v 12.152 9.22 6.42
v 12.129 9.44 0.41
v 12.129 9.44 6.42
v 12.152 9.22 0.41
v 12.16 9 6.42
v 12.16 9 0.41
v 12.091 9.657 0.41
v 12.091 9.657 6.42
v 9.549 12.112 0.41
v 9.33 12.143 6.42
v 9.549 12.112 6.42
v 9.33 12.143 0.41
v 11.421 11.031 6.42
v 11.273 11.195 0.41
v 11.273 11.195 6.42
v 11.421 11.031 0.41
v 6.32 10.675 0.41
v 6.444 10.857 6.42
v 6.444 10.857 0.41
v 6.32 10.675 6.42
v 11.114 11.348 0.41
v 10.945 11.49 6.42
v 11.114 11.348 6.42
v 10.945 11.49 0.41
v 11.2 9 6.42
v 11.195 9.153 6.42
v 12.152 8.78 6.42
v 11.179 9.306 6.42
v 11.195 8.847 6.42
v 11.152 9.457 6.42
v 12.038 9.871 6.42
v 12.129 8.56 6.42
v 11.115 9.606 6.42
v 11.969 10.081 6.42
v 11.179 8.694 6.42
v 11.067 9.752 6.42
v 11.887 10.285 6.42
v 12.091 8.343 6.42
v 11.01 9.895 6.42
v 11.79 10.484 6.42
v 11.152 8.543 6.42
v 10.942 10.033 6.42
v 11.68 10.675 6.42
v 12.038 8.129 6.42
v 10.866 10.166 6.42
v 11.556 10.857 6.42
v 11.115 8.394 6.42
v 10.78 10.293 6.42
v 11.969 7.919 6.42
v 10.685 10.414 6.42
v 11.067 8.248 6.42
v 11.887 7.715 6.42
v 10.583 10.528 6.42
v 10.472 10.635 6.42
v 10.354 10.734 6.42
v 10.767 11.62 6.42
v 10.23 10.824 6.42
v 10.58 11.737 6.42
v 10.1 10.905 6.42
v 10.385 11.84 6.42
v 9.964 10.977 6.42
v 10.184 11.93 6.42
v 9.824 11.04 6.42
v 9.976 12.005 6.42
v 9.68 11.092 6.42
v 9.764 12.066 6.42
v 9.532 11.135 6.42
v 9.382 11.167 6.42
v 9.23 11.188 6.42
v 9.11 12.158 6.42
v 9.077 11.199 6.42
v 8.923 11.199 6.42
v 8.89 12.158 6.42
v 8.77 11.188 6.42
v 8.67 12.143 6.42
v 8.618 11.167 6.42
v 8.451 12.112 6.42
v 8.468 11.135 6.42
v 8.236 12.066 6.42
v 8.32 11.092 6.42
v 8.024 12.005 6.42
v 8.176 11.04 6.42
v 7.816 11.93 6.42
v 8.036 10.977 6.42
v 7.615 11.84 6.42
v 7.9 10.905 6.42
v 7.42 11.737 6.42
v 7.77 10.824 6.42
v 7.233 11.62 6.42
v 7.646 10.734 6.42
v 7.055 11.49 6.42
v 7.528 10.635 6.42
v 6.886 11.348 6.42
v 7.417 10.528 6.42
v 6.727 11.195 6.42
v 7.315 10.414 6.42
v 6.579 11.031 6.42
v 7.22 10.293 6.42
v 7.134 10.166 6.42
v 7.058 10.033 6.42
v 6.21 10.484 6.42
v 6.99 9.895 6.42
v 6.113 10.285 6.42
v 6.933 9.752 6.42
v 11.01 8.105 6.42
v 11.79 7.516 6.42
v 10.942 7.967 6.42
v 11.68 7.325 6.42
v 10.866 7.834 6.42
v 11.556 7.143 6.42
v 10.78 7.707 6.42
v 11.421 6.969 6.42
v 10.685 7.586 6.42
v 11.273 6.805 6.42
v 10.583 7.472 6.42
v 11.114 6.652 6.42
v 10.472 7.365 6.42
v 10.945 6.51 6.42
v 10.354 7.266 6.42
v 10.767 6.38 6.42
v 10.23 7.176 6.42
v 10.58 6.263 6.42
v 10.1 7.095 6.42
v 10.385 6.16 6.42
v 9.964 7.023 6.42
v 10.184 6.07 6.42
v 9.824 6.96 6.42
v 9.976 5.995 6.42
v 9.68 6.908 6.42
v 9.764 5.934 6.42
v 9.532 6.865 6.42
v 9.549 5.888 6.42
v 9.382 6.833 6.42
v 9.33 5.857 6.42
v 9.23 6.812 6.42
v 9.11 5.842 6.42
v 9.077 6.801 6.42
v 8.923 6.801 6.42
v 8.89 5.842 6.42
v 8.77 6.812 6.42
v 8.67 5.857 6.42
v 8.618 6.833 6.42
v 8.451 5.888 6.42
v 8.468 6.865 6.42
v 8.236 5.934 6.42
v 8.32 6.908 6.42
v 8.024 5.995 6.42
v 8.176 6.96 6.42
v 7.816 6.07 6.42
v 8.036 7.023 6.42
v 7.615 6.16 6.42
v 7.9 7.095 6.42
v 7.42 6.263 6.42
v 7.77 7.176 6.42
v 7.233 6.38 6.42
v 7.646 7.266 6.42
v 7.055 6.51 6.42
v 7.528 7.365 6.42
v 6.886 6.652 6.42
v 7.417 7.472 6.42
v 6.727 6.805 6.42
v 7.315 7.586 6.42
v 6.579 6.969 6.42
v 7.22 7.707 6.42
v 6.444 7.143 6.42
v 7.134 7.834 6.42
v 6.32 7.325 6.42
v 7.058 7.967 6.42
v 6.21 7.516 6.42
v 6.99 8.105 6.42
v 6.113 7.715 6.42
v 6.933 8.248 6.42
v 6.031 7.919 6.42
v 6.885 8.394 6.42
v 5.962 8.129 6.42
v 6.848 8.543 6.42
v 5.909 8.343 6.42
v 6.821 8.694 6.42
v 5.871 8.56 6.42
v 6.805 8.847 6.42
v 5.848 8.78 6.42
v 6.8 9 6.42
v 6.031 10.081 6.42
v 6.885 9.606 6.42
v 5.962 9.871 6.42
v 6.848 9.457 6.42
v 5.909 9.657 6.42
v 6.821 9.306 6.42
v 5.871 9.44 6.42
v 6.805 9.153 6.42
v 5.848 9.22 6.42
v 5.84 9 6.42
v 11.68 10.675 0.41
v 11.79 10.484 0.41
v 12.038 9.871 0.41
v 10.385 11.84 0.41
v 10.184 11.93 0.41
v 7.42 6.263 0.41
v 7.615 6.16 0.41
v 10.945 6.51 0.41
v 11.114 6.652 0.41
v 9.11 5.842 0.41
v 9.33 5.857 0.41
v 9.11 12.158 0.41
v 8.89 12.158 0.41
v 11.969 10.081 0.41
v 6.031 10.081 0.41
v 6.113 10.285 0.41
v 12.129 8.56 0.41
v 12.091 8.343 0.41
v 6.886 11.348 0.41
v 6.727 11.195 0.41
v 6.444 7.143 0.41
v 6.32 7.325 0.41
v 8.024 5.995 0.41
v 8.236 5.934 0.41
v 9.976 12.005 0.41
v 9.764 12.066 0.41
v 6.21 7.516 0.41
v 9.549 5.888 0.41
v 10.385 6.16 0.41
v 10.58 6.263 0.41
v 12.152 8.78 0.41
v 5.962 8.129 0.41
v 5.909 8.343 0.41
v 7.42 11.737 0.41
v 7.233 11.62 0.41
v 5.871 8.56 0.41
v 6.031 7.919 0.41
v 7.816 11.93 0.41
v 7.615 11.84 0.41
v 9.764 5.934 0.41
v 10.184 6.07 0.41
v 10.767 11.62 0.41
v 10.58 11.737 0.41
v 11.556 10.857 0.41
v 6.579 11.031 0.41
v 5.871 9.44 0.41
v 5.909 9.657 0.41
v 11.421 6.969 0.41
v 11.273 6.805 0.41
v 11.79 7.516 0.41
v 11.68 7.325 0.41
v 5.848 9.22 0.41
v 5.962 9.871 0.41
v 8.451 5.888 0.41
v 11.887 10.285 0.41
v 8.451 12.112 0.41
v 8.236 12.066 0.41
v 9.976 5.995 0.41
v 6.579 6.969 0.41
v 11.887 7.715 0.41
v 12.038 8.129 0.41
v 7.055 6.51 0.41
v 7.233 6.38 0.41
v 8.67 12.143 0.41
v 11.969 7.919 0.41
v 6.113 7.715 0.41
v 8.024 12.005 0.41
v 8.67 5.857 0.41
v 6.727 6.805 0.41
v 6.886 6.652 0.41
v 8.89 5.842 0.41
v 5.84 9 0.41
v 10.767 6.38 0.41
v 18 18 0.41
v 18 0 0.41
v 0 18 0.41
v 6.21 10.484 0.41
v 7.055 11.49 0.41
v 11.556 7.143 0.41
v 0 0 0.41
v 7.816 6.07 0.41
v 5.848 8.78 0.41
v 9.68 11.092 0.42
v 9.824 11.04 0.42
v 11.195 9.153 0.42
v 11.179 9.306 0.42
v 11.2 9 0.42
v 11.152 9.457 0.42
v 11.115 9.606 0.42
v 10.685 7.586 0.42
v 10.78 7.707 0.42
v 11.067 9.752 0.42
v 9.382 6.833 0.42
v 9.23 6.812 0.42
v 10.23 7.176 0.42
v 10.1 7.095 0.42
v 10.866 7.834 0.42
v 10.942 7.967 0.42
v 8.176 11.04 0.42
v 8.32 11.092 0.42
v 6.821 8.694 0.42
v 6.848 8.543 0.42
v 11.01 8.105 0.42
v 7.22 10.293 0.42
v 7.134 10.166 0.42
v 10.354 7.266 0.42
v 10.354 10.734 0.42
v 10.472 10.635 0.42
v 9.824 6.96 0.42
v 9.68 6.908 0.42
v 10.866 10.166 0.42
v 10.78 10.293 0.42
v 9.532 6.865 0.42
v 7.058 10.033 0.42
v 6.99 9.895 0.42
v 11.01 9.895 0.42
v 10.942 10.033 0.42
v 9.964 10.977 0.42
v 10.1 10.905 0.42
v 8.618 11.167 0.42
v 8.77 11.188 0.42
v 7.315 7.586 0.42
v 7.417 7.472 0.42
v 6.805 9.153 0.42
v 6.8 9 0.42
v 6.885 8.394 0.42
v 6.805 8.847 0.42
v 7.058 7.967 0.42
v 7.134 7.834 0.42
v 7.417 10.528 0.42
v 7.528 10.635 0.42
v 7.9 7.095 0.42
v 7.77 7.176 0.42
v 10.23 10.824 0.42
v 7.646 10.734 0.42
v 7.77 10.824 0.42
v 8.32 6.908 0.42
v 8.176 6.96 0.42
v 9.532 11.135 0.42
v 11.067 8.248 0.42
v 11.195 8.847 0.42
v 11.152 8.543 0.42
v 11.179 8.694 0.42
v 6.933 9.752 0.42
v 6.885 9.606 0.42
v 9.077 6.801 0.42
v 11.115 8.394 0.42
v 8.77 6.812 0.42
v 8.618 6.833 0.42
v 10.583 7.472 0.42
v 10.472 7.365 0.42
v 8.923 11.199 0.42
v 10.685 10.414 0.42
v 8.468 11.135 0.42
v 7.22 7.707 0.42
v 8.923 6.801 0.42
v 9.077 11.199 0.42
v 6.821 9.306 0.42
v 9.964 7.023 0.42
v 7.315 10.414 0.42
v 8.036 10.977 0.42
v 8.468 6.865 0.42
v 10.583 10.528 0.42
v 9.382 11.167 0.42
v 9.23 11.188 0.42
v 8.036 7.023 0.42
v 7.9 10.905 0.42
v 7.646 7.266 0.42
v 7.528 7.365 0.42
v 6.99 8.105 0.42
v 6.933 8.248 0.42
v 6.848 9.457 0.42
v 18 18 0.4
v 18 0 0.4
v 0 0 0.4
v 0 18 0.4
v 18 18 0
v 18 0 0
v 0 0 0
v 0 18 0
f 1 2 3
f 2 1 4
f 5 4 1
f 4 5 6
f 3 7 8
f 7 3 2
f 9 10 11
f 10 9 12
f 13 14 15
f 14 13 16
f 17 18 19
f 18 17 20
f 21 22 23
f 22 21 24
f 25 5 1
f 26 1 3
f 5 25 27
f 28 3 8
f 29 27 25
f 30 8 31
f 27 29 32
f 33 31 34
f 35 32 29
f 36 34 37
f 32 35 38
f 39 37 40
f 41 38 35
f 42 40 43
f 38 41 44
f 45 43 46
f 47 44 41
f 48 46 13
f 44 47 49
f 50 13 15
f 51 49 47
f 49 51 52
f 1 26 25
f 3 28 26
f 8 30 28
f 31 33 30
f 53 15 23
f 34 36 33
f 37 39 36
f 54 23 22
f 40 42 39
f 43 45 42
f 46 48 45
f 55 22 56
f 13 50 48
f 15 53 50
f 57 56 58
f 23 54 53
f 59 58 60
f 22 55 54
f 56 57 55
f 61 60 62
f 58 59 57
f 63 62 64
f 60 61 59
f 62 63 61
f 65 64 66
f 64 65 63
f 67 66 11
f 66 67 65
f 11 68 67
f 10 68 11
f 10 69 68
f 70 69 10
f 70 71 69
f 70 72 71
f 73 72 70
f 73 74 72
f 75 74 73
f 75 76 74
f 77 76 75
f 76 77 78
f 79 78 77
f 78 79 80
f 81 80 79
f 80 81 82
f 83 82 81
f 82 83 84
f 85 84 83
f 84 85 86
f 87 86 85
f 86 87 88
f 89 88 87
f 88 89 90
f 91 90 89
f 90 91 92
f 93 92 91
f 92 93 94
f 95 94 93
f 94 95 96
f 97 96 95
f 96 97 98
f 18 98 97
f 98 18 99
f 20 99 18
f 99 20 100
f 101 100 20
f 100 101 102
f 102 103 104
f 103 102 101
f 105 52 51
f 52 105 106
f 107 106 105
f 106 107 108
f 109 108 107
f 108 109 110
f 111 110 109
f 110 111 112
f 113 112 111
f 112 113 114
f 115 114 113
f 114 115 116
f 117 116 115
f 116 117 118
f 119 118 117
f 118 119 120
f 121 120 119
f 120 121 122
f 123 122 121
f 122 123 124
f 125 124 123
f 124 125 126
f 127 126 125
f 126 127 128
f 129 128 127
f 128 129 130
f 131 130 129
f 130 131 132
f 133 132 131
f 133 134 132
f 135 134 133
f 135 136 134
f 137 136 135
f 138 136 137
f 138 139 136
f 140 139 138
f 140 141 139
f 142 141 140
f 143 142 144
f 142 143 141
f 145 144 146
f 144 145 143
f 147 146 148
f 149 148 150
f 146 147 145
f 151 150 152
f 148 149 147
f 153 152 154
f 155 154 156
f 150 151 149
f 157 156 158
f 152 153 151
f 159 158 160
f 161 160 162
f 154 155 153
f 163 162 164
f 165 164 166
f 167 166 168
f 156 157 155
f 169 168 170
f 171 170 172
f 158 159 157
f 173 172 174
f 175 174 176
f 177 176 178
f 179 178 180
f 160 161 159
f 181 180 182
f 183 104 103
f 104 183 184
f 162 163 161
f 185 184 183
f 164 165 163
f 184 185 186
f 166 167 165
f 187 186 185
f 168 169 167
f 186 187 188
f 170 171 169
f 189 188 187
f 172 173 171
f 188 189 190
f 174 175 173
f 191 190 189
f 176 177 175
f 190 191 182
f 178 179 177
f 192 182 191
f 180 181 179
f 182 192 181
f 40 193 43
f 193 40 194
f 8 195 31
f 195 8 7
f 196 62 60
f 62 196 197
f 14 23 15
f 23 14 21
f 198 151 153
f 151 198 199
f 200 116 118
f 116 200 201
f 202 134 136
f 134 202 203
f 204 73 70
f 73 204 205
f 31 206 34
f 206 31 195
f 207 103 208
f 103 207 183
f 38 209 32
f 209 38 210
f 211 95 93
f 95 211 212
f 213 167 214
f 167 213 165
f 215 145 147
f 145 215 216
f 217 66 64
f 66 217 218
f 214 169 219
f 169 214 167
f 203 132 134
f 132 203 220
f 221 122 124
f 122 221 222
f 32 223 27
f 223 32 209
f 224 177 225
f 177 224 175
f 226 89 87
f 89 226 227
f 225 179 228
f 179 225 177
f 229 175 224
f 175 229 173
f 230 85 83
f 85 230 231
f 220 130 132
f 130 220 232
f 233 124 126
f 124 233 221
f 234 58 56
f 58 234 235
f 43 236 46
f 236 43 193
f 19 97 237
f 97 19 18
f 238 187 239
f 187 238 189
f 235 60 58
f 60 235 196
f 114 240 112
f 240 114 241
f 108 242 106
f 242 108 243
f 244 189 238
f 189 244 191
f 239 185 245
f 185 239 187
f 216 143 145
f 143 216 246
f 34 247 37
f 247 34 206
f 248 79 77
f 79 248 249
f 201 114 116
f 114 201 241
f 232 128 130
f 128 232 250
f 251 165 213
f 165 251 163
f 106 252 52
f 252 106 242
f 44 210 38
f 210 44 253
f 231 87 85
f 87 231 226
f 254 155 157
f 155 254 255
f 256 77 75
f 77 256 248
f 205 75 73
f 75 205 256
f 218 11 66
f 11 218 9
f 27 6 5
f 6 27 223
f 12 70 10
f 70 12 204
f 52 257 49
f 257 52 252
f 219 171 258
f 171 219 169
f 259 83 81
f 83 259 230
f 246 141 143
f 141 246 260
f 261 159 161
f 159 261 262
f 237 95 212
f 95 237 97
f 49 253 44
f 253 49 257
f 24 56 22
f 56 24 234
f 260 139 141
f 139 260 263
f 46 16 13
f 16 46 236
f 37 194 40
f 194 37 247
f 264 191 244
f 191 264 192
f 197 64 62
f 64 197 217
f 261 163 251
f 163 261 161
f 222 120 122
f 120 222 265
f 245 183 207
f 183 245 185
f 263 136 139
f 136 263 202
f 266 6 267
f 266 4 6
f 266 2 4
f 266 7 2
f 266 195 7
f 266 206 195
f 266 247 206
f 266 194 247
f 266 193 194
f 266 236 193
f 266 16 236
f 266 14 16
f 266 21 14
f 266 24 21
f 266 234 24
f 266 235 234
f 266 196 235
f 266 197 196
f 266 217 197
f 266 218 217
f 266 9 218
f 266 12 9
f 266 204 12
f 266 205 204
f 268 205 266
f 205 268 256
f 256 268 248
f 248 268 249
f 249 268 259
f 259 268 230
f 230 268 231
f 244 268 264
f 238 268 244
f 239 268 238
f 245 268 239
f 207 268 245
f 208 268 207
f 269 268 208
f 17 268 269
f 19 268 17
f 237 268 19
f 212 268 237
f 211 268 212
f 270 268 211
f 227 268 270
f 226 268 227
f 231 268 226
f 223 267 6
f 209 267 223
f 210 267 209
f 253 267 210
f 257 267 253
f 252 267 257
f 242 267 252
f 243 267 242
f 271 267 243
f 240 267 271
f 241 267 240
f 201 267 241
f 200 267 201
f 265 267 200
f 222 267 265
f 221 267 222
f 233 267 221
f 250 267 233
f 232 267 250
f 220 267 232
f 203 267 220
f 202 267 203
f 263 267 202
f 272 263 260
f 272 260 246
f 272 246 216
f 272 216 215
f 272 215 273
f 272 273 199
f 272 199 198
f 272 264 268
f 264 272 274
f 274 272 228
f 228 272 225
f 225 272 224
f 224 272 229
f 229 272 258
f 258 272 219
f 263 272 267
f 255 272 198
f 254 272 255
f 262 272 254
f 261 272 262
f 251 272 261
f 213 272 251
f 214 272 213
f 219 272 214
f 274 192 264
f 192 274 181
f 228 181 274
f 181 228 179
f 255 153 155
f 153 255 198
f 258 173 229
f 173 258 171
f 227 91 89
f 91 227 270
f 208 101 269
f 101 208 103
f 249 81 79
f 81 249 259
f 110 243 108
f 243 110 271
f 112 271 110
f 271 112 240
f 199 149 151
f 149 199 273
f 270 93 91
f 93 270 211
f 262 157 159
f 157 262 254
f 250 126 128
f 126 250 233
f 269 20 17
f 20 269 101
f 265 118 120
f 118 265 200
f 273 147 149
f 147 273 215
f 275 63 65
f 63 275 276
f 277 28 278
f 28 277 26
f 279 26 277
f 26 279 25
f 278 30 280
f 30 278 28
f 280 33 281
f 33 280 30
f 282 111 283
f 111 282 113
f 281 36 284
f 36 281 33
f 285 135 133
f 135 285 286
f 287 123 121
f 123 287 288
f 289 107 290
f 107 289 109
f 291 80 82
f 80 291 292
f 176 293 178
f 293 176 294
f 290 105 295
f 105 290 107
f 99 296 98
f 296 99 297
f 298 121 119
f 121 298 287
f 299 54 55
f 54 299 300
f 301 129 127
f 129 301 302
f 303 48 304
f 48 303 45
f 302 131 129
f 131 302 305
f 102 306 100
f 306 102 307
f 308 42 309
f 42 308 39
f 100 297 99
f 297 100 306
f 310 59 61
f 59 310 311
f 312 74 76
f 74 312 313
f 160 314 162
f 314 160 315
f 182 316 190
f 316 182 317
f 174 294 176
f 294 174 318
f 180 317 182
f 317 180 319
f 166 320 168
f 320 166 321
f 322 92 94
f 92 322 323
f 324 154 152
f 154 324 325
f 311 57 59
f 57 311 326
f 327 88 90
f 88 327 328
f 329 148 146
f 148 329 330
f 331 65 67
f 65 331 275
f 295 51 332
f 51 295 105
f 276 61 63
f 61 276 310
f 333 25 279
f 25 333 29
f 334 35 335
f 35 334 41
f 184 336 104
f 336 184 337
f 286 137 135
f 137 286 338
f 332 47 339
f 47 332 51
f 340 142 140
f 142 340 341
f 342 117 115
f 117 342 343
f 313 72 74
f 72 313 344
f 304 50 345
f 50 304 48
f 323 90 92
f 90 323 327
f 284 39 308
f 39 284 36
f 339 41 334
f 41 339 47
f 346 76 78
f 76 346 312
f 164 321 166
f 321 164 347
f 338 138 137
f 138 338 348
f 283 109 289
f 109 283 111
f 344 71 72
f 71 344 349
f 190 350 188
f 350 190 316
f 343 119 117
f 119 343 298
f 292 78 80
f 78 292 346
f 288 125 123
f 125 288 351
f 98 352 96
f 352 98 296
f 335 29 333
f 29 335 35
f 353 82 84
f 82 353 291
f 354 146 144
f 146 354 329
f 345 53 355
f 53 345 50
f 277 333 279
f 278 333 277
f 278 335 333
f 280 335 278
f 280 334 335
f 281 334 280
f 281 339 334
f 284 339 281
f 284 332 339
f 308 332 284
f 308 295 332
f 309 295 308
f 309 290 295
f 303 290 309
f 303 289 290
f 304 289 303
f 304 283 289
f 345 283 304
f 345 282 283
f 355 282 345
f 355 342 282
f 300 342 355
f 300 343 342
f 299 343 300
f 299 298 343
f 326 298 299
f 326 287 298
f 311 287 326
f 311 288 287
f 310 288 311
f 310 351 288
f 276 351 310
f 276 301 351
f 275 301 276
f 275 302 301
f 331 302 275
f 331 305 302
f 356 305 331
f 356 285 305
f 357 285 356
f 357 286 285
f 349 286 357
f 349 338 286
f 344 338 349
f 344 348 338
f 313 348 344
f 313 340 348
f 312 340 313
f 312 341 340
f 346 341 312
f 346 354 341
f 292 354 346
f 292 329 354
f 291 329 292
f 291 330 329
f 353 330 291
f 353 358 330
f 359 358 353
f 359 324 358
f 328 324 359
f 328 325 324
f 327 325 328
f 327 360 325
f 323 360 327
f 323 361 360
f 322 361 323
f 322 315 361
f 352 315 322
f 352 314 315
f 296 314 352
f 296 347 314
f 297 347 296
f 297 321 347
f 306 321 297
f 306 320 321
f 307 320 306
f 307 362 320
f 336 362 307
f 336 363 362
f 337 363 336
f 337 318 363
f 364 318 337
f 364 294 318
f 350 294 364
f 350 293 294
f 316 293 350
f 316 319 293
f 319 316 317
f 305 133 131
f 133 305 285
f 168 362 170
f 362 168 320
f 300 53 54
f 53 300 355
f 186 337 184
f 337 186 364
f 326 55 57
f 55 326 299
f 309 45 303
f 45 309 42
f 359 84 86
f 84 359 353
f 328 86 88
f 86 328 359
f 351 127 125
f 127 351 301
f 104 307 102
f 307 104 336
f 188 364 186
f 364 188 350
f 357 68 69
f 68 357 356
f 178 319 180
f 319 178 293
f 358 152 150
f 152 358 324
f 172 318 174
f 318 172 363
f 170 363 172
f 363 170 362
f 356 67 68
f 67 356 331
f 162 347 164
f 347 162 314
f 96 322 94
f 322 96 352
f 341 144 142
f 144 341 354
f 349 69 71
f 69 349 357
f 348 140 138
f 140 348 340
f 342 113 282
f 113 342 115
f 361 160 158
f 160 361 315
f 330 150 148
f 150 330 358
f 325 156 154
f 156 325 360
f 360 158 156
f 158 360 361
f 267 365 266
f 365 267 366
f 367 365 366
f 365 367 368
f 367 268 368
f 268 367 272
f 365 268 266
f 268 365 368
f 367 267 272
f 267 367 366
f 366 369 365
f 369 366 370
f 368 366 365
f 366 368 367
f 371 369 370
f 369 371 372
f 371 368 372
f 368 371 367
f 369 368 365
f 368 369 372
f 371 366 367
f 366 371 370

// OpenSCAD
// file: ../../Base/PlacementOptions.scad
// Fischertechnik Box Foundation
// Placement Options

// Alignment
NoAlign = 0;
AlignLeft = 1;
AlignBottom = 2;
AlignCenter = 3;
AlignRight = 4;
AlignTop = 5;

// Element rotation degree steps
rotations = [0, -90, -180, -270];

// Rotation
NoRotation = 0;
Rotate0 = 0;
Rotate90 = 1;
Rotate180 = 2;
Rotate270 = 3;

// Docking (seen from above)
NoDock = -1;
DockLeft = 0;
DockTop = 1;
DockRight = 2;
DockCorner = 2;
DockBottom = 3;

// Web corners
LowerLeft = 0;
UpperLeft = 1;
UpperRight = 2;
LowerRight = 3;

// Web position relative to corner
LeftOfCorner = 0;
RightOfCorner = 1;
// file: ../../Base/Boxes.scad
// Fischertechnik Box Foundation
// Pre-designed Boxes

use <Constants.scad>

include <PlacementOptions.scad>

box190Width = 190;
box190Depth = 130;
box130Width = 130;
box130Depth = 95;
boxUsageHeight = 33.9;
boxWallThickness = 2.4;
boxBaseThickness = 1.0;
boxWebWidth = 3.0;

// getBoxWallThickness()
// Gets the wall thickness of a Fischertechnik Box

function getBoxWallThickness() = boxWallThickness;

// Gets the usable height of a fischertechnik box
function getBoxUsageHeight() = boxUsageHeight;

// Gets the thickness of the Fischertechnik box base.
function getBoxBaseThickness() = boxBaseThickness;

// Gets the width of a box web
function getBoxWebWidth() = boxWebWidth;

// Gets the usable inner space of a Box 190 as an x/y-list
function getBox190Space() = [
    box190Width - 2*getBoxWallThickness(), 
    box190Depth - 2*getBoxWallThickness() ];

// Imports the Fischertechnik empty box 130x190 mm and places it at position 0,0
// 190x130 are the outer sizes, the inner space is slightly smaller. Use getBox190Space() to get the inner sizes.
// This module needs the STL file "Fischertechnik Box 130x190.stl" in the library path.
// The box is positioned that the usable inner space is at the 0,0,0 position. The

module Box190() {
    translate([-getBoxWallThickness(),-getBoxWallThickness(),-getBoxBaseThickness()])
        import("Fischertechnik Box 130x190.stl", convexity=3);
}

// Gets the usable inner space of a Box 130 as an x/y-list
function getBox130Space() = [
    box130Width - 2*getBoxWallThickness(), 
    box130Depth - 2*getBoxWallThickness() ];

// Imports the Fischertechnik empty box 95x130 mm and places it at position 0,0
// 190x130 are the outer sizes, the inner space is slightly smaller. Use getBox190Space() to get the inner sizes.
// This module needs the STL file "Fischertechnik Box 95x130.stl" in the library path.
// The box is positioned that the usable inner space is at the 0,0,0 position. The

module Box130() {
    translate([-getBoxWallThickness(),-getBoxWallThickness(),-getBoxBaseThickness()])
        import("Fischertechnik Box 95x130.stl", convexity=3);
}

// Creates a web at the specified box walls
// corner 0 = LowerLeft, 1 = UpperLeft, 2 = UpperRight, 3 = LowerRight
// side 0 = LeftOfCorner, 1 = RightOfCorner
// distance = Distance in mm from the corner
// box = inner width and depth of the box (default: Box 190)
// webWidth = length of the web (default is 3 mms)
// webThickness = thickness of the web (default is 1 mm)

module BoxWeb(corner, side, distance, box=getBox190Space(), webWidth=getBoxWebWidth(), webThickness=1.0) {
    sink = getBoxWallThickness()/2;

    width = (corner % 2 == 0) ? 
            (side == LeftOfCorner ? webWidth : webThickness) :
            (side == LeftOfCorner ? webThickness : webWidth);

    depth = (corner % 2 == 0) ? 
            (side == RightOfCorner ? webWidth : webThickness) :
            (side == RightOfCorner ? webThickness : webWidth);
    
    xDiff = corner == LowerLeft ? 
                (side == LeftOfCorner ? -sink : distance) :
            (corner == UpperLeft ?                
                (side == LeftOfCorner ? distance : -sink) :
            (corner == UpperRight ?
                (side == LeftOfCorner ? box.x-webWidth+sink : box.x-distance-webThickness) :
                (side == LeftOfCorner ? box.x-distance-webThickness: box.x-webWidth+sink)));

    yDiff = corner == LowerLeft ? 
                (side == RightOfCorner ? -sink : distance) :
            (corner == UpperLeft ?
                (side == RightOfCorner ? box.y-distance : box.y-webWidth+sink) :
            (corner == UpperRight ?
                (side == RightOfCorner ? box.y-webWidth+sink : box.y-distance) :
                (side == RightOfCorner ? distance : -sink)));
    
    translate([xDiff, yDiff, -getExcess()])
        cube([width, depth, boxUsageHeight + 2*getExcess()]);
}
// file: ../../Base/Rotation.scad
// Fischertechnik Box Foundation
// Geometry Helpers Rotation

include <PlacementOptions.scad>

// getRotatedSpace(space, rotation=NoRotation)
// Rotates the space dependent on the specified rotation

function getRotatedSpace(space, rotation=NoRotation) = [
    (rotation == Rotate90 || rotation == Rotate270) ? space.y : space.x,
    (rotation == Rotate90 || rotation == Rotate270) ? space.x : space.y
];

// Rotates the given space around the fixed left lower corner
// space = the space the children needs as width/depth list [width,depth]
// rotation = 0 Rotate0 degrees, 1 Rotate90 degrees, 2 Rotate180 degrees, 3 Rotate270 degrees (equivalent to -90)

module RotateFix(space, rotation=Rotate0) {
    dy = (rotation == Rotate0 || rotation == Rotate270) ? 0 :
        (rotation == Rotate90) ? space.x :
        space.y;
    dx = (rotation < Rotate180) ? 0 :
        (rotation == Rotate180) ? space.x :
        space.y;
    
    translate([dx, dy, 0])
        rotate([0, 0, rotations[rotation]])
            children();
}
// file: ../../Base/Alignment.scad
// Fischertechnik Box Foundation
// Geometry Helpers Alignment

include <PlacementOptions.scad>

// getAlignedX(elementWidth, spaceWidth, align=AlignRight, offset=0)
// Gets the aligned X offset of an element with the given
// width in the given space.
// elementWidth = The width of the element to positon
// spaceWidth = The space where the element should be aligned
// align = 0 AlignLeft, 1 AlignCenter, 2 AlignRight
// offset = an optional offset from the aligned position. When
// aligned left or centered, then positive values are in X direction.
// When aligned right then positive values are in negative X direction.

function getAlignedX(elementWidth, spaceWidth, align=AlignRight, offset=0) =
    (align == AlignLeft) ?
        offset :
        ((align == AlignCenter) ?
        (spaceWidth - elementWidth)/2 + offset :
        spaceWidth - offset - elementWidth);

// getAlignedY(elementDepth, spaceDepth, align=AlignTop, offset=0)
// Gets the aligned Y offset of an element with the given
// depth in the given space.
// elementDepth = The depth of the element to positon
// spaceDepth = The space where the element should be aligned
// align = 0 AlignBottom, 1 AlignCenter, 2 AlignTop
// offset = an optional offset from the aligned position. When
// aligned bottom or centered, then positive values are in Y direction.
// When aligned top then positive values are in negative Y direction.

function getAlignedY(elementDepth, spaceDepth, align=AlignTop, offset=0) =
    (align == AlignBottom) ?
        offset :
        ((align == AlignCenter) ?
        (spaceDepth - elementDepth)/2 + offset :
        spaceDepth - offset - elementDepth);
// file: ../../Base/Placement.scad
// Fischertechnik Box Foundation
// Geometry Helpers Placement

use <Constants.scad>
use <Alignment.scad>
use <Rotation.scad>
use <Boxes.scad>

include <PlacementOptions.scad>

// Place(x=0, y=0, elementSpace=[0,0], alignX=AlignLeft, alignY=AlignBottom, rotation=Rotate0, boxSpace=getBox190Space())
// Places the child at the specified position
// y = Y-Position. This is a relative position when an X aligment is specified.
// x = X-Position. This is a relative position when an Y aligment is specified.
// elementSpace = space of the element to be placed [x,y]
// alignX = -1=NoAlign, 0 AlignLeft, 1 AlignCenter, 3 AlignRight (elementSpace and boxSpace required!)
// alignY = -1=NoAlign, 2 AlignBottom, 1 AlignCenter, 4 AlignTop (elementSpace and boxSpace required!)
// rotation = 0 Rotate0 0 degrees, 1 Rotate90 90 degrees, 
// 2 Rotate180 180 degrees, 3 Rotate270 270 degrees (equivalent to -90)
// boxSpace = Inner space of the box where the placement occurs [x,y] - default is Box 190x130 inner space

module Place(x=0, y=0, elementSpace=[0,0], 
  alignX=AlignLeft, alignY=AlignBottom, 
  rotation=NoRotation, boxSpace=getBox190Space()) {

    module Position(x, y, space, rotation=Rotate0) {
        translate([x, y, 0])
            RotateFix(space, rotation)
                children();
    }

    space = getRotatedSpace(elementSpace, rotation);
    alignedX = getAlignedX(space.x, boxSpace.x, alignX, x);
    alignedY = getAlignedY(space.y, boxSpace.y, alignY, y);
    Position(alignedX, alignedY, elementSpace, rotation)
        children();
}

// Center(space=getBox130Space(), elementSpace=[0,0])
// space = Space where the children is centered. For cylinder use centered=true and no elementSpace.
// elementSpace = space of the element to be centered [x,y]

module Center(space=getBox190Space(), elementSpace=[0,0]) {
    translate([(space.x - elementSpace.x) / 2, (space.y - elementSpace.y) / 2])
        children(0);
}

// CenterHorizontal(width=0, y=0, offset=0, space=getBox130Space())
// space = Space where the children is centered. For cylinder use centered=true and no elementSpace.
// elementSpace = space of the element to be centered [x,y]

module CenterHorizontal(width=0, y=0, offset=0, space=getBox190Space()) {
    translate([(space.x - width) / 2 + offset, y])
        children(0);
}

// CenterVertical(depth=0, x=0, offset=0, space=getBox130Space())
// space = Space where the children is centered. For cylinder use centered=true and no elementSpace.
// elementSpace = space of the element to be centered [x,y]

module CenterVertical(depth=0, x=0, offset=0, space=getBox190Space()) {
    translate([x, (space.y - depth) / 2 + offset])
        children(0);
}
// file: ../../Elements/AxisClip10.scad
// Fischertechnik Box Library
// Axis for clip 10
// 31023

use <../ModelBase/Simple.scad>

width = 12;
depth = 12;
height = 23;

// getAxisClip10Space()
// Gets the space of a frame for a clip 10 with spring ring (mot2)

function getAxisClip10Space() = [width, depth, height];

// AxisClip10()
// Axis for clip 10 with spring ring (mot2)

module AxisClip10() {
    LeveledAxisWithSpace(height, height-10, getAxisClip10Space());
}

// Tests
color("lightgray")
AxisClip10();
// file: ../../Base/Constants.scad
// Fischertechnik Box Foundation
// Constants

// Constant values necessary for multiple elements

// Base constants
dividerThickness = 1.2;
excess = 0.01;
fragments = 90;
tolerance = 0.8;

// Gets the thickness of a divider 
function getDividerThickness() = dividerThickness;

// Gets the excess that is used to merge walls into each other
function getExcess() = excess;

// Gets amount of fragments of a cylinder
function getFragments() = fragments;

// Gets the inner tolerance of a frame to each side
function getTolerance() = tolerance;


// Fischertechnik specific constants
axisDiameter = 4;
axisBottomDiameter = axisDiameter + 1;
standardEdgeDistance = 2.5;
standardWebDistance = 11.5;
standardCornerLength = 15;
tubeWallFactor = 0.8;

// Gets axis diameter
function getAxisDiameter() = axisDiameter;

// Gets axis bottom diameter for thicker part at the bottom
function getAxisBottomDiameter() = axisBottomDiameter;

// gets the standard distance to the wall of the box for dockable frames with webs
function getStandardEdgeDistance() = standardEdgeDistance;

// gets the standard distance of each web to the corner of the dockable frame
function getStandardWebDistance() = standardWebDistance;

// gets the standard length of the corner walls of a dockable frame
function getStandardCornerLength() = standardCornerLength;

// gets the wall thickness of a tube.
function getTubeWallThickness() = tubeWallFactor * getDividerThickness();
// file: ../../Elements/CylinderStepUpDownCog.scad
// Fischertechnik Box Library
// Cylinder for standing step-up/step-down cog
// 31052

use <../Base/Constants.scad>
use <../Base/Placement.scad>
use <../ModelBase/Simple.scad>
use <../ModelBase/Complex.scad>

width = 18;
depth = 18;
height = 6;

// getCylinderStepUpDownCogSpace()
// Gets the space the cylinder for a step-up/step-down cog needs

function getCylinderStepUpDownCogSpace() = [width, depth, height];

// CylinderAxis30()
// Standing cylinder for a step-up/step-down cog (mot1)
// 31052

module CylinderStepUpDownCog() {
    Space(getCylinderStepUpDownCogSpace());
    
    Center(getCylinderStepUpDownCogSpace())
        Tube(height, innerDiameter=getFrameAxisDepth());
}

// Tests
color("lightgray")
CylinderStepUpDownCog();
// file: ../TestPrint.scad
// 3D Print Test Base

use <../Base/Constants.scad>

use <../Elements/AxisClip10.scad>

module TestPrint(elementSpace) {
    cube([elementSpace.x, elementSpace.y, 0.4]);
    translate([0,0,0.4+getExcess()]) {
        children();
    }
}

TestPrint(getAxisClip10Space())
    AxisClip10();
// main file
// 3D Print Test Base
// CylinderStepUpDownCog

use <../TestPrint.scad>
use <../../Elements/CylinderStepUpDownCog.scad>

TestPrint(getCylinderStepUpDownCogSpace())
    CylinderStepUpDownCog();
